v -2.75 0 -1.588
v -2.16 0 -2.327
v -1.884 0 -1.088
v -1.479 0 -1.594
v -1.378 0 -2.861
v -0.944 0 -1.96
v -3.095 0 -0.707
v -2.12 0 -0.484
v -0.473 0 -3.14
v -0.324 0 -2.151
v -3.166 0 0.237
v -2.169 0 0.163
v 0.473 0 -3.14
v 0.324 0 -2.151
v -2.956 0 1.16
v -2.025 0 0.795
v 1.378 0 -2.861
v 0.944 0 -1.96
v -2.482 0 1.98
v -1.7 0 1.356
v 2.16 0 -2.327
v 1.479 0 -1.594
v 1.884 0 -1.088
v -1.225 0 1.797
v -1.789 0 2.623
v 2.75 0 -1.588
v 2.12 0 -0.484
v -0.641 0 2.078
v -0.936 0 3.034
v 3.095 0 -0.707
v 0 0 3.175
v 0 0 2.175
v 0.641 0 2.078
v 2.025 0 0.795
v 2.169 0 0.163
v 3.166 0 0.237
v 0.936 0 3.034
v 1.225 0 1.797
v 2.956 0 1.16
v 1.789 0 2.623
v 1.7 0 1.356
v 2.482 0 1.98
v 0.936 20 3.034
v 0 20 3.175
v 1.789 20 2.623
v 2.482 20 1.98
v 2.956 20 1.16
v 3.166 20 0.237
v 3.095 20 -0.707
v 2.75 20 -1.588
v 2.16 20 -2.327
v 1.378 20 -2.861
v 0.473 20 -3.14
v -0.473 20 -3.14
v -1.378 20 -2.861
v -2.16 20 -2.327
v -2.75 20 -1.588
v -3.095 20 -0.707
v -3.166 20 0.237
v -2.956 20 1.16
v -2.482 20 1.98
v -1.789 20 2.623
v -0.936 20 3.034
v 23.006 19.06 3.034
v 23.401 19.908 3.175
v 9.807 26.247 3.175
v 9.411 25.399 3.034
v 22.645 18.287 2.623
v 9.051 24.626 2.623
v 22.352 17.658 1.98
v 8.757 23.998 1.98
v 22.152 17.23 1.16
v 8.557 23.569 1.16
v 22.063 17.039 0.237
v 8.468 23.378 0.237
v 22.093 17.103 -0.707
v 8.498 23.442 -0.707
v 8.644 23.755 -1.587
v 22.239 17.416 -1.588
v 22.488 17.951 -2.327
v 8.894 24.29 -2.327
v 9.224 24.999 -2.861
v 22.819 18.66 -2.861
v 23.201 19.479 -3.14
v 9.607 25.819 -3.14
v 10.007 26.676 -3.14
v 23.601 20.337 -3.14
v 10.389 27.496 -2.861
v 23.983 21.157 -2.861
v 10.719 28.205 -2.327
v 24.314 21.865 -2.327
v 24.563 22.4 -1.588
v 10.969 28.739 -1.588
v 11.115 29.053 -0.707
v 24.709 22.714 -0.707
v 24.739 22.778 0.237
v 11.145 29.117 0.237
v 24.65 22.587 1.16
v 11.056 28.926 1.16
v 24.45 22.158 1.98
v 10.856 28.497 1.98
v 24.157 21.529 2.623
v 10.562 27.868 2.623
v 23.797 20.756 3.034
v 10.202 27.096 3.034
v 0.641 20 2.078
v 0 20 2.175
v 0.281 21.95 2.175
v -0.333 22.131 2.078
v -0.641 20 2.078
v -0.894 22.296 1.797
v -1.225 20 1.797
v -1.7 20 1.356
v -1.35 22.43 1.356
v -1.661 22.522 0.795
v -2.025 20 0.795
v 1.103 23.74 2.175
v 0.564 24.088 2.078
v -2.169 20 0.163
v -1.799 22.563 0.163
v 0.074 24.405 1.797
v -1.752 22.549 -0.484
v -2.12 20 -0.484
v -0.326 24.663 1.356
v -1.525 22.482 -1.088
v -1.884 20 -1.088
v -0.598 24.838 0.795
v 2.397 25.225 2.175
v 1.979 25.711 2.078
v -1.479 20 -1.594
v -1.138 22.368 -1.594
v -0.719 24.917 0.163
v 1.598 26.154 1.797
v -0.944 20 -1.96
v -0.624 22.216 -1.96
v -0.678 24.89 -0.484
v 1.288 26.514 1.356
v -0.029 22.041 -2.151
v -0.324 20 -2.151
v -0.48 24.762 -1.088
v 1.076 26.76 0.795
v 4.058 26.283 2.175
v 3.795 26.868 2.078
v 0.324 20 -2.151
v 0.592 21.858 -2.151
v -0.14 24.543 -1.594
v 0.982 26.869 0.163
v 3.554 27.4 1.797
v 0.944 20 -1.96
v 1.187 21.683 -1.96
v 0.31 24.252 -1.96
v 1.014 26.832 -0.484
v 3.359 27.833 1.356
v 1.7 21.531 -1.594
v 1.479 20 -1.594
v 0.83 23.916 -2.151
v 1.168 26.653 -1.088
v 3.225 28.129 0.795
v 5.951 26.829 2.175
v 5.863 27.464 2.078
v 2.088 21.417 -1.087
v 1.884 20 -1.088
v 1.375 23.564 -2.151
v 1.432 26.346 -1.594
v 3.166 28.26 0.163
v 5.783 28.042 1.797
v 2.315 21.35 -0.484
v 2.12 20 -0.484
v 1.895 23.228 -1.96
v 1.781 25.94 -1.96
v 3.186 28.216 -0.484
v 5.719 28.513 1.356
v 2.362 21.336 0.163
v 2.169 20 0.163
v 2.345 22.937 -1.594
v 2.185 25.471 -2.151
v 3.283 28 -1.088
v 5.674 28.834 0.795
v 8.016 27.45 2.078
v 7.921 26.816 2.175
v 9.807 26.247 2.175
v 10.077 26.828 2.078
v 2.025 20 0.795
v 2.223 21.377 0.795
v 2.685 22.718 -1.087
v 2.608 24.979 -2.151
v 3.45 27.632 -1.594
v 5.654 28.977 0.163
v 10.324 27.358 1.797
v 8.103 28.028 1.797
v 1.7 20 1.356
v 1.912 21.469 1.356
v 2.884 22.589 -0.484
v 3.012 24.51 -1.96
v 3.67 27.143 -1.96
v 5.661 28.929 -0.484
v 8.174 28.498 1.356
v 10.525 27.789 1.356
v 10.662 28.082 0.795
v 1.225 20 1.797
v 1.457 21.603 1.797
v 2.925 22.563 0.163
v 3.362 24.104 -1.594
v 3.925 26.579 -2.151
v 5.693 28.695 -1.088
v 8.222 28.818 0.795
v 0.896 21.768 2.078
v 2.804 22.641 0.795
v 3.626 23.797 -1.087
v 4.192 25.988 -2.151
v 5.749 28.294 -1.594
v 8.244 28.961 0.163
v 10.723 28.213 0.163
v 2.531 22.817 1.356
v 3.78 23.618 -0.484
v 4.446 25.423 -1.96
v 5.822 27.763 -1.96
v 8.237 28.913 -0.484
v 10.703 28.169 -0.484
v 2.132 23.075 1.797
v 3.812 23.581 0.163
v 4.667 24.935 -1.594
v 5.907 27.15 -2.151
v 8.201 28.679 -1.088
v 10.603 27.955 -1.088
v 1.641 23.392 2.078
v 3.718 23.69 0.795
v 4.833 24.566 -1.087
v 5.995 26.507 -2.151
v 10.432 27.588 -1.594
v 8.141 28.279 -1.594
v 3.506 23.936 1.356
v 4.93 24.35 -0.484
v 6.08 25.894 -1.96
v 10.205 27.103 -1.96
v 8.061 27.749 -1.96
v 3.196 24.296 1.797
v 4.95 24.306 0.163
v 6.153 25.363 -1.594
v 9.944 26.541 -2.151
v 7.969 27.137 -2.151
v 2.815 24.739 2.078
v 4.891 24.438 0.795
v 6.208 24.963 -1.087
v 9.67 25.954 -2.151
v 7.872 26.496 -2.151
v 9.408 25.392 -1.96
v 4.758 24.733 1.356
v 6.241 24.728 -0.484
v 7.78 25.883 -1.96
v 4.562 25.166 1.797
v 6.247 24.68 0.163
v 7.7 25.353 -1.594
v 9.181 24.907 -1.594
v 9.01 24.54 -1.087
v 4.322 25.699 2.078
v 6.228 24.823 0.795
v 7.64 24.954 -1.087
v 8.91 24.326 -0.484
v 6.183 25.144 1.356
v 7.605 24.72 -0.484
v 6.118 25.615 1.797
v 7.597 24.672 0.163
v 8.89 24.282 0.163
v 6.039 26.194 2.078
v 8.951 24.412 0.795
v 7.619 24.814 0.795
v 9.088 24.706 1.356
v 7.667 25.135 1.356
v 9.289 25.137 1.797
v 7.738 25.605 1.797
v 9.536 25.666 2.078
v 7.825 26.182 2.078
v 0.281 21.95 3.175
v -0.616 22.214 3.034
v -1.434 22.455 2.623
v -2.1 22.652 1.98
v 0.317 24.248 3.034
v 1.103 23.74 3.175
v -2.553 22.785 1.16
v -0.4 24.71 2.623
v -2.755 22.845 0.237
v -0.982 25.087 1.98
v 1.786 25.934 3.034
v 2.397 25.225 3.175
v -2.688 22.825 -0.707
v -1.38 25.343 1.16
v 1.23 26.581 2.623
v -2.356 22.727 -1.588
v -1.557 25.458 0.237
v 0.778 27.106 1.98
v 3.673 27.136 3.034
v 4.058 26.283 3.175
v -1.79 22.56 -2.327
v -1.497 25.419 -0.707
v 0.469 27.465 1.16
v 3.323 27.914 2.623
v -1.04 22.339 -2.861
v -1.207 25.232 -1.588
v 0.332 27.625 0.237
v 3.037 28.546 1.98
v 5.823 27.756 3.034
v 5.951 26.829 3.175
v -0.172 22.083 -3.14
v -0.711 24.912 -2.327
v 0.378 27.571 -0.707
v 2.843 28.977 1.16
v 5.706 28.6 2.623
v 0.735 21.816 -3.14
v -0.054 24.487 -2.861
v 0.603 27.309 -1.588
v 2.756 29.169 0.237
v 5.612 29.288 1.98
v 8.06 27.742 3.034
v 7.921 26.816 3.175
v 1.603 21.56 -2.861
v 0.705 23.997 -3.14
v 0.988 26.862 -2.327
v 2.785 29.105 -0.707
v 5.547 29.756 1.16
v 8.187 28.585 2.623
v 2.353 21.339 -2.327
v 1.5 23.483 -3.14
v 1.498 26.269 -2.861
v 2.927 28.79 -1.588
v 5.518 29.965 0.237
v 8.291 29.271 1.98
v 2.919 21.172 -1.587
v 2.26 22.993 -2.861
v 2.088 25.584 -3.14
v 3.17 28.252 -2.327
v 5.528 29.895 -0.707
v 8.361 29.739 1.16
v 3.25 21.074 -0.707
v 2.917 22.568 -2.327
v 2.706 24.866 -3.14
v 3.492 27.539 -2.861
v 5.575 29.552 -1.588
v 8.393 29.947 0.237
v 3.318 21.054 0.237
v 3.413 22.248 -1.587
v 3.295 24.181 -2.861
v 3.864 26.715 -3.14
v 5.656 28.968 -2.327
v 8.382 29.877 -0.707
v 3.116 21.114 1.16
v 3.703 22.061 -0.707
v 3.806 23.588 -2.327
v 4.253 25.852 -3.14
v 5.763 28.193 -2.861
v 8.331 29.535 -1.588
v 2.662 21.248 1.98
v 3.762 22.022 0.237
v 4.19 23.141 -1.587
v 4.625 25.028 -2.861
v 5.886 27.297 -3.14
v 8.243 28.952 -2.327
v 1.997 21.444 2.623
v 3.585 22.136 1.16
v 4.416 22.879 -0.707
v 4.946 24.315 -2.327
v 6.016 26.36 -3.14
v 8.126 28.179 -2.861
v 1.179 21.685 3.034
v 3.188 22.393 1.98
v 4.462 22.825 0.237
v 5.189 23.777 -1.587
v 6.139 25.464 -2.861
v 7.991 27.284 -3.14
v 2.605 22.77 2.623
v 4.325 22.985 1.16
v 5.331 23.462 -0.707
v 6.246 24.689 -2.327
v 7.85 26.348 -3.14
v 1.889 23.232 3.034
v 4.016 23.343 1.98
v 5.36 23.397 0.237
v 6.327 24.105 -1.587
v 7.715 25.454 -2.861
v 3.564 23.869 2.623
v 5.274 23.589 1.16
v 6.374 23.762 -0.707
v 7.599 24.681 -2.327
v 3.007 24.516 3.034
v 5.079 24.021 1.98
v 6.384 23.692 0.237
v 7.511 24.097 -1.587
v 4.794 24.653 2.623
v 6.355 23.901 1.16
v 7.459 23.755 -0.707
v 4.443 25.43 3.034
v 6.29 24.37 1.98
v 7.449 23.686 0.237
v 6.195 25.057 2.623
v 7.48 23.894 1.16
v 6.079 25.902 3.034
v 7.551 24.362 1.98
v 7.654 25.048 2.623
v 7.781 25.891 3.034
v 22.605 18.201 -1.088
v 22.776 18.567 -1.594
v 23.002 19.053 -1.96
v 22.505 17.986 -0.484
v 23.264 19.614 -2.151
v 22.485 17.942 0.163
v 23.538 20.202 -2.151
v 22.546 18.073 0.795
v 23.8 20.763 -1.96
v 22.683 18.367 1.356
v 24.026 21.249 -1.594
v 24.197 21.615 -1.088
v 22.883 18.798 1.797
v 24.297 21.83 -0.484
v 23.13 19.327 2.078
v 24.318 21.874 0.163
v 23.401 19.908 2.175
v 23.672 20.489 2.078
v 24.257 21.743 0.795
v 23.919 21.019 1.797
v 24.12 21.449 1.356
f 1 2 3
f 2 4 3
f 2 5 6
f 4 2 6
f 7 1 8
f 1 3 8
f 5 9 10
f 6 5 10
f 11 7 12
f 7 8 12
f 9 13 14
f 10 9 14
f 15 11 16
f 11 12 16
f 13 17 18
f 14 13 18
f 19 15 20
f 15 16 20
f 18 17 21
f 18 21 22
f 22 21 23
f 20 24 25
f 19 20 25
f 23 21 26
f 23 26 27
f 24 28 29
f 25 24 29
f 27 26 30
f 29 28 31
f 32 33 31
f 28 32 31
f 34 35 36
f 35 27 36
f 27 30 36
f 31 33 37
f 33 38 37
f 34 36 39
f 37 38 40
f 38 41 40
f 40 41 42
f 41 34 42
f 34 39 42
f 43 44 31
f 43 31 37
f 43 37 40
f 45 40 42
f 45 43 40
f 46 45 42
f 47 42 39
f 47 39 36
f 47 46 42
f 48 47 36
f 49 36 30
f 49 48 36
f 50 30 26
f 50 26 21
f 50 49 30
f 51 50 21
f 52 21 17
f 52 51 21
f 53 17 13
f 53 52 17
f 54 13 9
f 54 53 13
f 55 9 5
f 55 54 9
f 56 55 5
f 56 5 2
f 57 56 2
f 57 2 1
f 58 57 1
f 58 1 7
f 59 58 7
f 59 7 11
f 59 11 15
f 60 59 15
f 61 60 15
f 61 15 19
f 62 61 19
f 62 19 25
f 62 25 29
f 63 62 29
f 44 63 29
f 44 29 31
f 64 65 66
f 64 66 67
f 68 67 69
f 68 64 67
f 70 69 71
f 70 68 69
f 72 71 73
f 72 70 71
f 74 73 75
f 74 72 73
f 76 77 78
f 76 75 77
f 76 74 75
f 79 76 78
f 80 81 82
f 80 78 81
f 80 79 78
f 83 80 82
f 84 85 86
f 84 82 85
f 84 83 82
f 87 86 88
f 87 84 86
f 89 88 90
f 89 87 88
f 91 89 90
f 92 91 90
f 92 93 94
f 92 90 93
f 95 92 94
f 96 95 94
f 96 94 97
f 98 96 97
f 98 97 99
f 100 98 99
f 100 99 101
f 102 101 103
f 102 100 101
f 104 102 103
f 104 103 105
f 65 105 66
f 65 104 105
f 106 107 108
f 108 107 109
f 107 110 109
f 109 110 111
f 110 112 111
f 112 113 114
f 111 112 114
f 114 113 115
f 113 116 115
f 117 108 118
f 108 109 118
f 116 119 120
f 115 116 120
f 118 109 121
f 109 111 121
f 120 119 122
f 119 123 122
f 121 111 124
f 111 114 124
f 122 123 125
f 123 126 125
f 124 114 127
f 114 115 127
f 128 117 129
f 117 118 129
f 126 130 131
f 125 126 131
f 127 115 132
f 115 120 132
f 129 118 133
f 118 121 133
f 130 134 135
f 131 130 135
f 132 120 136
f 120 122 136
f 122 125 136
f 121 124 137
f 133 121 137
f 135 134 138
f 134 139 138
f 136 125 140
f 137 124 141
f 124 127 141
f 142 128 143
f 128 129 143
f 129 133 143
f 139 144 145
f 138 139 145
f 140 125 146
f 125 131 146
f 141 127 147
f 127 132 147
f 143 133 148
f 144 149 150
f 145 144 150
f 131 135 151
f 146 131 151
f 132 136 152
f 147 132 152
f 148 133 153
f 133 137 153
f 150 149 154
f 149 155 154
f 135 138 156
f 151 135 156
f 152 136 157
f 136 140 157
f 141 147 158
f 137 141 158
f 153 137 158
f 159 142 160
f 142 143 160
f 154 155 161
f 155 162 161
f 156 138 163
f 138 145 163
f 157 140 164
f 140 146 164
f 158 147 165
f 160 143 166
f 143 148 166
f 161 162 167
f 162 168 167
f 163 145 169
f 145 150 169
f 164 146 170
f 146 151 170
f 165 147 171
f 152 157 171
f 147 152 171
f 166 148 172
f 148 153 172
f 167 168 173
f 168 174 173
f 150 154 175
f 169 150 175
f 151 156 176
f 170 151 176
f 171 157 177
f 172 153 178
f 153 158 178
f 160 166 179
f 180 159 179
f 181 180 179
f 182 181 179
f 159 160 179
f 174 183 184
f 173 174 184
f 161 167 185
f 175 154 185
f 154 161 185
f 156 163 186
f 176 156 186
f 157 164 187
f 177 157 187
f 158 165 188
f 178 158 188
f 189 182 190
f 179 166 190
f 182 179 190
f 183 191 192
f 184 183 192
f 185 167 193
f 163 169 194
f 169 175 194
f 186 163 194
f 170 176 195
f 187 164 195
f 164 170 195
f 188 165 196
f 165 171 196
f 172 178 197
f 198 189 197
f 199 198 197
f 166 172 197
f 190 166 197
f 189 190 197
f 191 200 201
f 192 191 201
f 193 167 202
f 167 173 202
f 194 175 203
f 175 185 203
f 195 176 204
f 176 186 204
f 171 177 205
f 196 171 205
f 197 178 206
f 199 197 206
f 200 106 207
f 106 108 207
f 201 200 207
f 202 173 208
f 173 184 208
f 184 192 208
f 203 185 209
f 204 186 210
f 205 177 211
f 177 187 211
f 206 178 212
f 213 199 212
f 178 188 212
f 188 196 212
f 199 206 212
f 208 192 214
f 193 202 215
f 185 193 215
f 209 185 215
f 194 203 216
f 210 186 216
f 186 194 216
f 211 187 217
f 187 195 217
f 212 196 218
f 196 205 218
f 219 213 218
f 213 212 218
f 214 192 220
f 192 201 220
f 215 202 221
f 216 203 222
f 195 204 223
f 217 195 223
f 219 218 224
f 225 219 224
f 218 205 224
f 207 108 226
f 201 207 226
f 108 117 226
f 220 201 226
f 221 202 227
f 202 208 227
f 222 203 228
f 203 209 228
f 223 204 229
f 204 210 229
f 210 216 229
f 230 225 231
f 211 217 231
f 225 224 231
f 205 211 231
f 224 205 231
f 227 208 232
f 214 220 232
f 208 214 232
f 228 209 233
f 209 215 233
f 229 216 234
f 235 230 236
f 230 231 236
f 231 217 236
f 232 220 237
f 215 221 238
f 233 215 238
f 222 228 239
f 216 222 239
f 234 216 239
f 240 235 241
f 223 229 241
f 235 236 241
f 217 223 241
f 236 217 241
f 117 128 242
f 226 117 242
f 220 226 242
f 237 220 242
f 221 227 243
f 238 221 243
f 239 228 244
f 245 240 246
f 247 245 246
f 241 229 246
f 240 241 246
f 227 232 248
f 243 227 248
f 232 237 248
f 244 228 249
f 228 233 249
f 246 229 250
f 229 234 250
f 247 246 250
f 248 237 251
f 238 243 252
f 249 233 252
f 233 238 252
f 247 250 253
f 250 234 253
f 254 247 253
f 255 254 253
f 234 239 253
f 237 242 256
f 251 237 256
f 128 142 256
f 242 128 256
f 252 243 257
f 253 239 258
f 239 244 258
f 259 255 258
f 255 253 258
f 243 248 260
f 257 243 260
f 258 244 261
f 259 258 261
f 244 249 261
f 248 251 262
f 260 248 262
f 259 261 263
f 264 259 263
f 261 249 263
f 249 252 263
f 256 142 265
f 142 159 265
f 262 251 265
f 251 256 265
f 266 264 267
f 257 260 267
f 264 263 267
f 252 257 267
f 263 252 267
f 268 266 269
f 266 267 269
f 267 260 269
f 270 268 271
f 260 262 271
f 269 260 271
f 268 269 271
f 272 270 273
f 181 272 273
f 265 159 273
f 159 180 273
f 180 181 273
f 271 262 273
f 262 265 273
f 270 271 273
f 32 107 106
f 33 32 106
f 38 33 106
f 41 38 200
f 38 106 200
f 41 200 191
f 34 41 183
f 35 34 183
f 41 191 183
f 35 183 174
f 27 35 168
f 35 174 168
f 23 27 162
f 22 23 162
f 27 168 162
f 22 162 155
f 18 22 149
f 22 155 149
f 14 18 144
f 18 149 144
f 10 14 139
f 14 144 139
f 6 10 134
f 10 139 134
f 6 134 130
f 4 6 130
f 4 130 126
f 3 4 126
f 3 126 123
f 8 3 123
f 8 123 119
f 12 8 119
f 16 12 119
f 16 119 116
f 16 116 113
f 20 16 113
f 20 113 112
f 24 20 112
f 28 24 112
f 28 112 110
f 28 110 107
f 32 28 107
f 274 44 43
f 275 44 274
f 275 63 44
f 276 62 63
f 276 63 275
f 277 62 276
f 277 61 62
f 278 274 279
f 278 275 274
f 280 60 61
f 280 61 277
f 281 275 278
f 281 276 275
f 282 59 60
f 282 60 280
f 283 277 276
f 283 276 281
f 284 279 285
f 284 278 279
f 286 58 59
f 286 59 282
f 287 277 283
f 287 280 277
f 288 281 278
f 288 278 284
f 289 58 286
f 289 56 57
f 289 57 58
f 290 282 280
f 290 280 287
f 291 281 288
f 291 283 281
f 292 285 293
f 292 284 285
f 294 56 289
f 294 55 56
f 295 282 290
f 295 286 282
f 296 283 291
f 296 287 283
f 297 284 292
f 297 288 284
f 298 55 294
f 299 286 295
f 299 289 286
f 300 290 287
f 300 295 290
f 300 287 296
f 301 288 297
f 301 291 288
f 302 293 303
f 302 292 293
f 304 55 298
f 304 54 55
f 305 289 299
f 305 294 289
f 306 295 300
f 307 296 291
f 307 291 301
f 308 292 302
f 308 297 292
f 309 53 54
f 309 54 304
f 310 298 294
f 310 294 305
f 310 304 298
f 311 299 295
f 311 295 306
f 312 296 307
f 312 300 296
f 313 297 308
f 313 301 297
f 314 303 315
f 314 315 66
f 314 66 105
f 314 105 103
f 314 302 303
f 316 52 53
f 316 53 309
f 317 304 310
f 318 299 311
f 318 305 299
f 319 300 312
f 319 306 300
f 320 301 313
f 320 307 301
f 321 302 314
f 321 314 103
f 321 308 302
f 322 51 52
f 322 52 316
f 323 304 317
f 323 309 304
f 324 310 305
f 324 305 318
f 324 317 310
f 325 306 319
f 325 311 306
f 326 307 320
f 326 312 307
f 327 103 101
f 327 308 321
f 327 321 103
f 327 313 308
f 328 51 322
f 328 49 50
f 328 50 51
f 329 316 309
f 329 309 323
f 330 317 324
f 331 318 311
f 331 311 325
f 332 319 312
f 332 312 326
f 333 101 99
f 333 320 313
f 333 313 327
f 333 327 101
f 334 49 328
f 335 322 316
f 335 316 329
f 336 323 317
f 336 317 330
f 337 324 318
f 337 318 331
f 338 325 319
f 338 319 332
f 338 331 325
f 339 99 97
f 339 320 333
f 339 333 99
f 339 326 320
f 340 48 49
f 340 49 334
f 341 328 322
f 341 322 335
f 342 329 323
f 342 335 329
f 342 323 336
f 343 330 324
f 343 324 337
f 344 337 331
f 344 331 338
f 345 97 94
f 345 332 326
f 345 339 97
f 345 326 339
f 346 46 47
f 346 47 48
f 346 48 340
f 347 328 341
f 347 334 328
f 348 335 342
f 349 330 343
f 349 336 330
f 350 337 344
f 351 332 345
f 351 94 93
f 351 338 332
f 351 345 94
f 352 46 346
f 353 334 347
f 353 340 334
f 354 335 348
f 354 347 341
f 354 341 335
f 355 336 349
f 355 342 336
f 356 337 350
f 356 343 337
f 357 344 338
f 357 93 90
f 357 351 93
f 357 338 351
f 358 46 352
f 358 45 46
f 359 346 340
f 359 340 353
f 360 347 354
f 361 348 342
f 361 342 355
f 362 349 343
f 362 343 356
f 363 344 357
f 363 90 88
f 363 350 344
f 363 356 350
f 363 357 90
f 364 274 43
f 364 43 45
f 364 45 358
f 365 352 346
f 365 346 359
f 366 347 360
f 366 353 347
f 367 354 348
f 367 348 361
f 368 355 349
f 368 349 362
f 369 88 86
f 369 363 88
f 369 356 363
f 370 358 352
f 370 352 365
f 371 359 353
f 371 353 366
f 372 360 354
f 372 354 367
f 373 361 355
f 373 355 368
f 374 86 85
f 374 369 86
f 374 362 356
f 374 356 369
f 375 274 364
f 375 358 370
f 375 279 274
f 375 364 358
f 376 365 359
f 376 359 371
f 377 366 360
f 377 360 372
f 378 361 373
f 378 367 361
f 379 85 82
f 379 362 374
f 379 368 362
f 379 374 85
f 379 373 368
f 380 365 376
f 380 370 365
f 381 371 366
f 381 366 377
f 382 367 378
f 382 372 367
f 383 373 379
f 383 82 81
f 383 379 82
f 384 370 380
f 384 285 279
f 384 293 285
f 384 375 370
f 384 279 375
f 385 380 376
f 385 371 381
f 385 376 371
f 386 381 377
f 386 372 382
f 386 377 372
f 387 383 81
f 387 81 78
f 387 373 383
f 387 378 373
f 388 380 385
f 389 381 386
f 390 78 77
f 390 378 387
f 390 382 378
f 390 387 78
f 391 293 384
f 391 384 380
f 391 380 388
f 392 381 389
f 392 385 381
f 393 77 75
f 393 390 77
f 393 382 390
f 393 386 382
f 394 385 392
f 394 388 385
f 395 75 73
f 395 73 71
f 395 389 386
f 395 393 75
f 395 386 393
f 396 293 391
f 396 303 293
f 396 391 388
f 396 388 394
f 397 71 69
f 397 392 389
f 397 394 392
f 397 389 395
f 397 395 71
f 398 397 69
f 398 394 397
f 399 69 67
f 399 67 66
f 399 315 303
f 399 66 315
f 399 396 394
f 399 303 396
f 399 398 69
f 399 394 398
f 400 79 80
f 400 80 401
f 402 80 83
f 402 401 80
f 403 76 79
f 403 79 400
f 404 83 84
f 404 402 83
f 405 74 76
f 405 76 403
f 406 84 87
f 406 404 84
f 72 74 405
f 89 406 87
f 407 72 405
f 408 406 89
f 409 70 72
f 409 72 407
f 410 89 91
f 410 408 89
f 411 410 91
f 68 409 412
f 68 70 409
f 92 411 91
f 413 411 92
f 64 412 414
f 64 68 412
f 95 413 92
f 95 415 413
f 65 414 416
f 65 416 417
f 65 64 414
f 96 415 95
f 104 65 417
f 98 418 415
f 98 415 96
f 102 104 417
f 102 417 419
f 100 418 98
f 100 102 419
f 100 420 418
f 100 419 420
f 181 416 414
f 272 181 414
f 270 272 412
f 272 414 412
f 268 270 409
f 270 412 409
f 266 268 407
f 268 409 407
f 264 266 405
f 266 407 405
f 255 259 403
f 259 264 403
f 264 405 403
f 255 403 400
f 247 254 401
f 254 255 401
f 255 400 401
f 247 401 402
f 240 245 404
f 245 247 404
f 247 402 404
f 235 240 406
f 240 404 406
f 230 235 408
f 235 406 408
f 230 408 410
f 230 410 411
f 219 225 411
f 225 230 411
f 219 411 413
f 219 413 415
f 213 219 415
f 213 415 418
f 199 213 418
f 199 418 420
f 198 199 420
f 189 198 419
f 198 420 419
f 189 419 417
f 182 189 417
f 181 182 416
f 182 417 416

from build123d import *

# Parameters (mm, degrees)
SWEEP_SOTTILE1_PROFILE_R   = 3.175
SWEEP_SOTTILE1_PROFILE_R_2 = 2.175


with BuildPart() as part:
    # Sweep-Sottile1: sweep along a path in Schizzo1
    with BuildLine(Plane.XY) as sweep_sottile1_path:
        Line((0, 0), (0, 20))
        ThreePointArc((0, 20), (3.189533949, 25.813752694), (9.80653858, 26.247454091))
        Line((9.80653858, 26.247454091), (23.401155386, 19.908180165))
    # Sweep-Sottile1 profile (on start of the path) → Sweep-Sottile1 (sweep)
    with BuildSketch(Plane.ZX):
        Circle(SWEEP_SOTTILE1_PROFILE_R)
        Circle(SWEEP_SOTTILE1_PROFILE_R_2, mode=Mode.SUBTRACT)
    sweep(path=sweep_sottile1_path.line)


solid = part.part
